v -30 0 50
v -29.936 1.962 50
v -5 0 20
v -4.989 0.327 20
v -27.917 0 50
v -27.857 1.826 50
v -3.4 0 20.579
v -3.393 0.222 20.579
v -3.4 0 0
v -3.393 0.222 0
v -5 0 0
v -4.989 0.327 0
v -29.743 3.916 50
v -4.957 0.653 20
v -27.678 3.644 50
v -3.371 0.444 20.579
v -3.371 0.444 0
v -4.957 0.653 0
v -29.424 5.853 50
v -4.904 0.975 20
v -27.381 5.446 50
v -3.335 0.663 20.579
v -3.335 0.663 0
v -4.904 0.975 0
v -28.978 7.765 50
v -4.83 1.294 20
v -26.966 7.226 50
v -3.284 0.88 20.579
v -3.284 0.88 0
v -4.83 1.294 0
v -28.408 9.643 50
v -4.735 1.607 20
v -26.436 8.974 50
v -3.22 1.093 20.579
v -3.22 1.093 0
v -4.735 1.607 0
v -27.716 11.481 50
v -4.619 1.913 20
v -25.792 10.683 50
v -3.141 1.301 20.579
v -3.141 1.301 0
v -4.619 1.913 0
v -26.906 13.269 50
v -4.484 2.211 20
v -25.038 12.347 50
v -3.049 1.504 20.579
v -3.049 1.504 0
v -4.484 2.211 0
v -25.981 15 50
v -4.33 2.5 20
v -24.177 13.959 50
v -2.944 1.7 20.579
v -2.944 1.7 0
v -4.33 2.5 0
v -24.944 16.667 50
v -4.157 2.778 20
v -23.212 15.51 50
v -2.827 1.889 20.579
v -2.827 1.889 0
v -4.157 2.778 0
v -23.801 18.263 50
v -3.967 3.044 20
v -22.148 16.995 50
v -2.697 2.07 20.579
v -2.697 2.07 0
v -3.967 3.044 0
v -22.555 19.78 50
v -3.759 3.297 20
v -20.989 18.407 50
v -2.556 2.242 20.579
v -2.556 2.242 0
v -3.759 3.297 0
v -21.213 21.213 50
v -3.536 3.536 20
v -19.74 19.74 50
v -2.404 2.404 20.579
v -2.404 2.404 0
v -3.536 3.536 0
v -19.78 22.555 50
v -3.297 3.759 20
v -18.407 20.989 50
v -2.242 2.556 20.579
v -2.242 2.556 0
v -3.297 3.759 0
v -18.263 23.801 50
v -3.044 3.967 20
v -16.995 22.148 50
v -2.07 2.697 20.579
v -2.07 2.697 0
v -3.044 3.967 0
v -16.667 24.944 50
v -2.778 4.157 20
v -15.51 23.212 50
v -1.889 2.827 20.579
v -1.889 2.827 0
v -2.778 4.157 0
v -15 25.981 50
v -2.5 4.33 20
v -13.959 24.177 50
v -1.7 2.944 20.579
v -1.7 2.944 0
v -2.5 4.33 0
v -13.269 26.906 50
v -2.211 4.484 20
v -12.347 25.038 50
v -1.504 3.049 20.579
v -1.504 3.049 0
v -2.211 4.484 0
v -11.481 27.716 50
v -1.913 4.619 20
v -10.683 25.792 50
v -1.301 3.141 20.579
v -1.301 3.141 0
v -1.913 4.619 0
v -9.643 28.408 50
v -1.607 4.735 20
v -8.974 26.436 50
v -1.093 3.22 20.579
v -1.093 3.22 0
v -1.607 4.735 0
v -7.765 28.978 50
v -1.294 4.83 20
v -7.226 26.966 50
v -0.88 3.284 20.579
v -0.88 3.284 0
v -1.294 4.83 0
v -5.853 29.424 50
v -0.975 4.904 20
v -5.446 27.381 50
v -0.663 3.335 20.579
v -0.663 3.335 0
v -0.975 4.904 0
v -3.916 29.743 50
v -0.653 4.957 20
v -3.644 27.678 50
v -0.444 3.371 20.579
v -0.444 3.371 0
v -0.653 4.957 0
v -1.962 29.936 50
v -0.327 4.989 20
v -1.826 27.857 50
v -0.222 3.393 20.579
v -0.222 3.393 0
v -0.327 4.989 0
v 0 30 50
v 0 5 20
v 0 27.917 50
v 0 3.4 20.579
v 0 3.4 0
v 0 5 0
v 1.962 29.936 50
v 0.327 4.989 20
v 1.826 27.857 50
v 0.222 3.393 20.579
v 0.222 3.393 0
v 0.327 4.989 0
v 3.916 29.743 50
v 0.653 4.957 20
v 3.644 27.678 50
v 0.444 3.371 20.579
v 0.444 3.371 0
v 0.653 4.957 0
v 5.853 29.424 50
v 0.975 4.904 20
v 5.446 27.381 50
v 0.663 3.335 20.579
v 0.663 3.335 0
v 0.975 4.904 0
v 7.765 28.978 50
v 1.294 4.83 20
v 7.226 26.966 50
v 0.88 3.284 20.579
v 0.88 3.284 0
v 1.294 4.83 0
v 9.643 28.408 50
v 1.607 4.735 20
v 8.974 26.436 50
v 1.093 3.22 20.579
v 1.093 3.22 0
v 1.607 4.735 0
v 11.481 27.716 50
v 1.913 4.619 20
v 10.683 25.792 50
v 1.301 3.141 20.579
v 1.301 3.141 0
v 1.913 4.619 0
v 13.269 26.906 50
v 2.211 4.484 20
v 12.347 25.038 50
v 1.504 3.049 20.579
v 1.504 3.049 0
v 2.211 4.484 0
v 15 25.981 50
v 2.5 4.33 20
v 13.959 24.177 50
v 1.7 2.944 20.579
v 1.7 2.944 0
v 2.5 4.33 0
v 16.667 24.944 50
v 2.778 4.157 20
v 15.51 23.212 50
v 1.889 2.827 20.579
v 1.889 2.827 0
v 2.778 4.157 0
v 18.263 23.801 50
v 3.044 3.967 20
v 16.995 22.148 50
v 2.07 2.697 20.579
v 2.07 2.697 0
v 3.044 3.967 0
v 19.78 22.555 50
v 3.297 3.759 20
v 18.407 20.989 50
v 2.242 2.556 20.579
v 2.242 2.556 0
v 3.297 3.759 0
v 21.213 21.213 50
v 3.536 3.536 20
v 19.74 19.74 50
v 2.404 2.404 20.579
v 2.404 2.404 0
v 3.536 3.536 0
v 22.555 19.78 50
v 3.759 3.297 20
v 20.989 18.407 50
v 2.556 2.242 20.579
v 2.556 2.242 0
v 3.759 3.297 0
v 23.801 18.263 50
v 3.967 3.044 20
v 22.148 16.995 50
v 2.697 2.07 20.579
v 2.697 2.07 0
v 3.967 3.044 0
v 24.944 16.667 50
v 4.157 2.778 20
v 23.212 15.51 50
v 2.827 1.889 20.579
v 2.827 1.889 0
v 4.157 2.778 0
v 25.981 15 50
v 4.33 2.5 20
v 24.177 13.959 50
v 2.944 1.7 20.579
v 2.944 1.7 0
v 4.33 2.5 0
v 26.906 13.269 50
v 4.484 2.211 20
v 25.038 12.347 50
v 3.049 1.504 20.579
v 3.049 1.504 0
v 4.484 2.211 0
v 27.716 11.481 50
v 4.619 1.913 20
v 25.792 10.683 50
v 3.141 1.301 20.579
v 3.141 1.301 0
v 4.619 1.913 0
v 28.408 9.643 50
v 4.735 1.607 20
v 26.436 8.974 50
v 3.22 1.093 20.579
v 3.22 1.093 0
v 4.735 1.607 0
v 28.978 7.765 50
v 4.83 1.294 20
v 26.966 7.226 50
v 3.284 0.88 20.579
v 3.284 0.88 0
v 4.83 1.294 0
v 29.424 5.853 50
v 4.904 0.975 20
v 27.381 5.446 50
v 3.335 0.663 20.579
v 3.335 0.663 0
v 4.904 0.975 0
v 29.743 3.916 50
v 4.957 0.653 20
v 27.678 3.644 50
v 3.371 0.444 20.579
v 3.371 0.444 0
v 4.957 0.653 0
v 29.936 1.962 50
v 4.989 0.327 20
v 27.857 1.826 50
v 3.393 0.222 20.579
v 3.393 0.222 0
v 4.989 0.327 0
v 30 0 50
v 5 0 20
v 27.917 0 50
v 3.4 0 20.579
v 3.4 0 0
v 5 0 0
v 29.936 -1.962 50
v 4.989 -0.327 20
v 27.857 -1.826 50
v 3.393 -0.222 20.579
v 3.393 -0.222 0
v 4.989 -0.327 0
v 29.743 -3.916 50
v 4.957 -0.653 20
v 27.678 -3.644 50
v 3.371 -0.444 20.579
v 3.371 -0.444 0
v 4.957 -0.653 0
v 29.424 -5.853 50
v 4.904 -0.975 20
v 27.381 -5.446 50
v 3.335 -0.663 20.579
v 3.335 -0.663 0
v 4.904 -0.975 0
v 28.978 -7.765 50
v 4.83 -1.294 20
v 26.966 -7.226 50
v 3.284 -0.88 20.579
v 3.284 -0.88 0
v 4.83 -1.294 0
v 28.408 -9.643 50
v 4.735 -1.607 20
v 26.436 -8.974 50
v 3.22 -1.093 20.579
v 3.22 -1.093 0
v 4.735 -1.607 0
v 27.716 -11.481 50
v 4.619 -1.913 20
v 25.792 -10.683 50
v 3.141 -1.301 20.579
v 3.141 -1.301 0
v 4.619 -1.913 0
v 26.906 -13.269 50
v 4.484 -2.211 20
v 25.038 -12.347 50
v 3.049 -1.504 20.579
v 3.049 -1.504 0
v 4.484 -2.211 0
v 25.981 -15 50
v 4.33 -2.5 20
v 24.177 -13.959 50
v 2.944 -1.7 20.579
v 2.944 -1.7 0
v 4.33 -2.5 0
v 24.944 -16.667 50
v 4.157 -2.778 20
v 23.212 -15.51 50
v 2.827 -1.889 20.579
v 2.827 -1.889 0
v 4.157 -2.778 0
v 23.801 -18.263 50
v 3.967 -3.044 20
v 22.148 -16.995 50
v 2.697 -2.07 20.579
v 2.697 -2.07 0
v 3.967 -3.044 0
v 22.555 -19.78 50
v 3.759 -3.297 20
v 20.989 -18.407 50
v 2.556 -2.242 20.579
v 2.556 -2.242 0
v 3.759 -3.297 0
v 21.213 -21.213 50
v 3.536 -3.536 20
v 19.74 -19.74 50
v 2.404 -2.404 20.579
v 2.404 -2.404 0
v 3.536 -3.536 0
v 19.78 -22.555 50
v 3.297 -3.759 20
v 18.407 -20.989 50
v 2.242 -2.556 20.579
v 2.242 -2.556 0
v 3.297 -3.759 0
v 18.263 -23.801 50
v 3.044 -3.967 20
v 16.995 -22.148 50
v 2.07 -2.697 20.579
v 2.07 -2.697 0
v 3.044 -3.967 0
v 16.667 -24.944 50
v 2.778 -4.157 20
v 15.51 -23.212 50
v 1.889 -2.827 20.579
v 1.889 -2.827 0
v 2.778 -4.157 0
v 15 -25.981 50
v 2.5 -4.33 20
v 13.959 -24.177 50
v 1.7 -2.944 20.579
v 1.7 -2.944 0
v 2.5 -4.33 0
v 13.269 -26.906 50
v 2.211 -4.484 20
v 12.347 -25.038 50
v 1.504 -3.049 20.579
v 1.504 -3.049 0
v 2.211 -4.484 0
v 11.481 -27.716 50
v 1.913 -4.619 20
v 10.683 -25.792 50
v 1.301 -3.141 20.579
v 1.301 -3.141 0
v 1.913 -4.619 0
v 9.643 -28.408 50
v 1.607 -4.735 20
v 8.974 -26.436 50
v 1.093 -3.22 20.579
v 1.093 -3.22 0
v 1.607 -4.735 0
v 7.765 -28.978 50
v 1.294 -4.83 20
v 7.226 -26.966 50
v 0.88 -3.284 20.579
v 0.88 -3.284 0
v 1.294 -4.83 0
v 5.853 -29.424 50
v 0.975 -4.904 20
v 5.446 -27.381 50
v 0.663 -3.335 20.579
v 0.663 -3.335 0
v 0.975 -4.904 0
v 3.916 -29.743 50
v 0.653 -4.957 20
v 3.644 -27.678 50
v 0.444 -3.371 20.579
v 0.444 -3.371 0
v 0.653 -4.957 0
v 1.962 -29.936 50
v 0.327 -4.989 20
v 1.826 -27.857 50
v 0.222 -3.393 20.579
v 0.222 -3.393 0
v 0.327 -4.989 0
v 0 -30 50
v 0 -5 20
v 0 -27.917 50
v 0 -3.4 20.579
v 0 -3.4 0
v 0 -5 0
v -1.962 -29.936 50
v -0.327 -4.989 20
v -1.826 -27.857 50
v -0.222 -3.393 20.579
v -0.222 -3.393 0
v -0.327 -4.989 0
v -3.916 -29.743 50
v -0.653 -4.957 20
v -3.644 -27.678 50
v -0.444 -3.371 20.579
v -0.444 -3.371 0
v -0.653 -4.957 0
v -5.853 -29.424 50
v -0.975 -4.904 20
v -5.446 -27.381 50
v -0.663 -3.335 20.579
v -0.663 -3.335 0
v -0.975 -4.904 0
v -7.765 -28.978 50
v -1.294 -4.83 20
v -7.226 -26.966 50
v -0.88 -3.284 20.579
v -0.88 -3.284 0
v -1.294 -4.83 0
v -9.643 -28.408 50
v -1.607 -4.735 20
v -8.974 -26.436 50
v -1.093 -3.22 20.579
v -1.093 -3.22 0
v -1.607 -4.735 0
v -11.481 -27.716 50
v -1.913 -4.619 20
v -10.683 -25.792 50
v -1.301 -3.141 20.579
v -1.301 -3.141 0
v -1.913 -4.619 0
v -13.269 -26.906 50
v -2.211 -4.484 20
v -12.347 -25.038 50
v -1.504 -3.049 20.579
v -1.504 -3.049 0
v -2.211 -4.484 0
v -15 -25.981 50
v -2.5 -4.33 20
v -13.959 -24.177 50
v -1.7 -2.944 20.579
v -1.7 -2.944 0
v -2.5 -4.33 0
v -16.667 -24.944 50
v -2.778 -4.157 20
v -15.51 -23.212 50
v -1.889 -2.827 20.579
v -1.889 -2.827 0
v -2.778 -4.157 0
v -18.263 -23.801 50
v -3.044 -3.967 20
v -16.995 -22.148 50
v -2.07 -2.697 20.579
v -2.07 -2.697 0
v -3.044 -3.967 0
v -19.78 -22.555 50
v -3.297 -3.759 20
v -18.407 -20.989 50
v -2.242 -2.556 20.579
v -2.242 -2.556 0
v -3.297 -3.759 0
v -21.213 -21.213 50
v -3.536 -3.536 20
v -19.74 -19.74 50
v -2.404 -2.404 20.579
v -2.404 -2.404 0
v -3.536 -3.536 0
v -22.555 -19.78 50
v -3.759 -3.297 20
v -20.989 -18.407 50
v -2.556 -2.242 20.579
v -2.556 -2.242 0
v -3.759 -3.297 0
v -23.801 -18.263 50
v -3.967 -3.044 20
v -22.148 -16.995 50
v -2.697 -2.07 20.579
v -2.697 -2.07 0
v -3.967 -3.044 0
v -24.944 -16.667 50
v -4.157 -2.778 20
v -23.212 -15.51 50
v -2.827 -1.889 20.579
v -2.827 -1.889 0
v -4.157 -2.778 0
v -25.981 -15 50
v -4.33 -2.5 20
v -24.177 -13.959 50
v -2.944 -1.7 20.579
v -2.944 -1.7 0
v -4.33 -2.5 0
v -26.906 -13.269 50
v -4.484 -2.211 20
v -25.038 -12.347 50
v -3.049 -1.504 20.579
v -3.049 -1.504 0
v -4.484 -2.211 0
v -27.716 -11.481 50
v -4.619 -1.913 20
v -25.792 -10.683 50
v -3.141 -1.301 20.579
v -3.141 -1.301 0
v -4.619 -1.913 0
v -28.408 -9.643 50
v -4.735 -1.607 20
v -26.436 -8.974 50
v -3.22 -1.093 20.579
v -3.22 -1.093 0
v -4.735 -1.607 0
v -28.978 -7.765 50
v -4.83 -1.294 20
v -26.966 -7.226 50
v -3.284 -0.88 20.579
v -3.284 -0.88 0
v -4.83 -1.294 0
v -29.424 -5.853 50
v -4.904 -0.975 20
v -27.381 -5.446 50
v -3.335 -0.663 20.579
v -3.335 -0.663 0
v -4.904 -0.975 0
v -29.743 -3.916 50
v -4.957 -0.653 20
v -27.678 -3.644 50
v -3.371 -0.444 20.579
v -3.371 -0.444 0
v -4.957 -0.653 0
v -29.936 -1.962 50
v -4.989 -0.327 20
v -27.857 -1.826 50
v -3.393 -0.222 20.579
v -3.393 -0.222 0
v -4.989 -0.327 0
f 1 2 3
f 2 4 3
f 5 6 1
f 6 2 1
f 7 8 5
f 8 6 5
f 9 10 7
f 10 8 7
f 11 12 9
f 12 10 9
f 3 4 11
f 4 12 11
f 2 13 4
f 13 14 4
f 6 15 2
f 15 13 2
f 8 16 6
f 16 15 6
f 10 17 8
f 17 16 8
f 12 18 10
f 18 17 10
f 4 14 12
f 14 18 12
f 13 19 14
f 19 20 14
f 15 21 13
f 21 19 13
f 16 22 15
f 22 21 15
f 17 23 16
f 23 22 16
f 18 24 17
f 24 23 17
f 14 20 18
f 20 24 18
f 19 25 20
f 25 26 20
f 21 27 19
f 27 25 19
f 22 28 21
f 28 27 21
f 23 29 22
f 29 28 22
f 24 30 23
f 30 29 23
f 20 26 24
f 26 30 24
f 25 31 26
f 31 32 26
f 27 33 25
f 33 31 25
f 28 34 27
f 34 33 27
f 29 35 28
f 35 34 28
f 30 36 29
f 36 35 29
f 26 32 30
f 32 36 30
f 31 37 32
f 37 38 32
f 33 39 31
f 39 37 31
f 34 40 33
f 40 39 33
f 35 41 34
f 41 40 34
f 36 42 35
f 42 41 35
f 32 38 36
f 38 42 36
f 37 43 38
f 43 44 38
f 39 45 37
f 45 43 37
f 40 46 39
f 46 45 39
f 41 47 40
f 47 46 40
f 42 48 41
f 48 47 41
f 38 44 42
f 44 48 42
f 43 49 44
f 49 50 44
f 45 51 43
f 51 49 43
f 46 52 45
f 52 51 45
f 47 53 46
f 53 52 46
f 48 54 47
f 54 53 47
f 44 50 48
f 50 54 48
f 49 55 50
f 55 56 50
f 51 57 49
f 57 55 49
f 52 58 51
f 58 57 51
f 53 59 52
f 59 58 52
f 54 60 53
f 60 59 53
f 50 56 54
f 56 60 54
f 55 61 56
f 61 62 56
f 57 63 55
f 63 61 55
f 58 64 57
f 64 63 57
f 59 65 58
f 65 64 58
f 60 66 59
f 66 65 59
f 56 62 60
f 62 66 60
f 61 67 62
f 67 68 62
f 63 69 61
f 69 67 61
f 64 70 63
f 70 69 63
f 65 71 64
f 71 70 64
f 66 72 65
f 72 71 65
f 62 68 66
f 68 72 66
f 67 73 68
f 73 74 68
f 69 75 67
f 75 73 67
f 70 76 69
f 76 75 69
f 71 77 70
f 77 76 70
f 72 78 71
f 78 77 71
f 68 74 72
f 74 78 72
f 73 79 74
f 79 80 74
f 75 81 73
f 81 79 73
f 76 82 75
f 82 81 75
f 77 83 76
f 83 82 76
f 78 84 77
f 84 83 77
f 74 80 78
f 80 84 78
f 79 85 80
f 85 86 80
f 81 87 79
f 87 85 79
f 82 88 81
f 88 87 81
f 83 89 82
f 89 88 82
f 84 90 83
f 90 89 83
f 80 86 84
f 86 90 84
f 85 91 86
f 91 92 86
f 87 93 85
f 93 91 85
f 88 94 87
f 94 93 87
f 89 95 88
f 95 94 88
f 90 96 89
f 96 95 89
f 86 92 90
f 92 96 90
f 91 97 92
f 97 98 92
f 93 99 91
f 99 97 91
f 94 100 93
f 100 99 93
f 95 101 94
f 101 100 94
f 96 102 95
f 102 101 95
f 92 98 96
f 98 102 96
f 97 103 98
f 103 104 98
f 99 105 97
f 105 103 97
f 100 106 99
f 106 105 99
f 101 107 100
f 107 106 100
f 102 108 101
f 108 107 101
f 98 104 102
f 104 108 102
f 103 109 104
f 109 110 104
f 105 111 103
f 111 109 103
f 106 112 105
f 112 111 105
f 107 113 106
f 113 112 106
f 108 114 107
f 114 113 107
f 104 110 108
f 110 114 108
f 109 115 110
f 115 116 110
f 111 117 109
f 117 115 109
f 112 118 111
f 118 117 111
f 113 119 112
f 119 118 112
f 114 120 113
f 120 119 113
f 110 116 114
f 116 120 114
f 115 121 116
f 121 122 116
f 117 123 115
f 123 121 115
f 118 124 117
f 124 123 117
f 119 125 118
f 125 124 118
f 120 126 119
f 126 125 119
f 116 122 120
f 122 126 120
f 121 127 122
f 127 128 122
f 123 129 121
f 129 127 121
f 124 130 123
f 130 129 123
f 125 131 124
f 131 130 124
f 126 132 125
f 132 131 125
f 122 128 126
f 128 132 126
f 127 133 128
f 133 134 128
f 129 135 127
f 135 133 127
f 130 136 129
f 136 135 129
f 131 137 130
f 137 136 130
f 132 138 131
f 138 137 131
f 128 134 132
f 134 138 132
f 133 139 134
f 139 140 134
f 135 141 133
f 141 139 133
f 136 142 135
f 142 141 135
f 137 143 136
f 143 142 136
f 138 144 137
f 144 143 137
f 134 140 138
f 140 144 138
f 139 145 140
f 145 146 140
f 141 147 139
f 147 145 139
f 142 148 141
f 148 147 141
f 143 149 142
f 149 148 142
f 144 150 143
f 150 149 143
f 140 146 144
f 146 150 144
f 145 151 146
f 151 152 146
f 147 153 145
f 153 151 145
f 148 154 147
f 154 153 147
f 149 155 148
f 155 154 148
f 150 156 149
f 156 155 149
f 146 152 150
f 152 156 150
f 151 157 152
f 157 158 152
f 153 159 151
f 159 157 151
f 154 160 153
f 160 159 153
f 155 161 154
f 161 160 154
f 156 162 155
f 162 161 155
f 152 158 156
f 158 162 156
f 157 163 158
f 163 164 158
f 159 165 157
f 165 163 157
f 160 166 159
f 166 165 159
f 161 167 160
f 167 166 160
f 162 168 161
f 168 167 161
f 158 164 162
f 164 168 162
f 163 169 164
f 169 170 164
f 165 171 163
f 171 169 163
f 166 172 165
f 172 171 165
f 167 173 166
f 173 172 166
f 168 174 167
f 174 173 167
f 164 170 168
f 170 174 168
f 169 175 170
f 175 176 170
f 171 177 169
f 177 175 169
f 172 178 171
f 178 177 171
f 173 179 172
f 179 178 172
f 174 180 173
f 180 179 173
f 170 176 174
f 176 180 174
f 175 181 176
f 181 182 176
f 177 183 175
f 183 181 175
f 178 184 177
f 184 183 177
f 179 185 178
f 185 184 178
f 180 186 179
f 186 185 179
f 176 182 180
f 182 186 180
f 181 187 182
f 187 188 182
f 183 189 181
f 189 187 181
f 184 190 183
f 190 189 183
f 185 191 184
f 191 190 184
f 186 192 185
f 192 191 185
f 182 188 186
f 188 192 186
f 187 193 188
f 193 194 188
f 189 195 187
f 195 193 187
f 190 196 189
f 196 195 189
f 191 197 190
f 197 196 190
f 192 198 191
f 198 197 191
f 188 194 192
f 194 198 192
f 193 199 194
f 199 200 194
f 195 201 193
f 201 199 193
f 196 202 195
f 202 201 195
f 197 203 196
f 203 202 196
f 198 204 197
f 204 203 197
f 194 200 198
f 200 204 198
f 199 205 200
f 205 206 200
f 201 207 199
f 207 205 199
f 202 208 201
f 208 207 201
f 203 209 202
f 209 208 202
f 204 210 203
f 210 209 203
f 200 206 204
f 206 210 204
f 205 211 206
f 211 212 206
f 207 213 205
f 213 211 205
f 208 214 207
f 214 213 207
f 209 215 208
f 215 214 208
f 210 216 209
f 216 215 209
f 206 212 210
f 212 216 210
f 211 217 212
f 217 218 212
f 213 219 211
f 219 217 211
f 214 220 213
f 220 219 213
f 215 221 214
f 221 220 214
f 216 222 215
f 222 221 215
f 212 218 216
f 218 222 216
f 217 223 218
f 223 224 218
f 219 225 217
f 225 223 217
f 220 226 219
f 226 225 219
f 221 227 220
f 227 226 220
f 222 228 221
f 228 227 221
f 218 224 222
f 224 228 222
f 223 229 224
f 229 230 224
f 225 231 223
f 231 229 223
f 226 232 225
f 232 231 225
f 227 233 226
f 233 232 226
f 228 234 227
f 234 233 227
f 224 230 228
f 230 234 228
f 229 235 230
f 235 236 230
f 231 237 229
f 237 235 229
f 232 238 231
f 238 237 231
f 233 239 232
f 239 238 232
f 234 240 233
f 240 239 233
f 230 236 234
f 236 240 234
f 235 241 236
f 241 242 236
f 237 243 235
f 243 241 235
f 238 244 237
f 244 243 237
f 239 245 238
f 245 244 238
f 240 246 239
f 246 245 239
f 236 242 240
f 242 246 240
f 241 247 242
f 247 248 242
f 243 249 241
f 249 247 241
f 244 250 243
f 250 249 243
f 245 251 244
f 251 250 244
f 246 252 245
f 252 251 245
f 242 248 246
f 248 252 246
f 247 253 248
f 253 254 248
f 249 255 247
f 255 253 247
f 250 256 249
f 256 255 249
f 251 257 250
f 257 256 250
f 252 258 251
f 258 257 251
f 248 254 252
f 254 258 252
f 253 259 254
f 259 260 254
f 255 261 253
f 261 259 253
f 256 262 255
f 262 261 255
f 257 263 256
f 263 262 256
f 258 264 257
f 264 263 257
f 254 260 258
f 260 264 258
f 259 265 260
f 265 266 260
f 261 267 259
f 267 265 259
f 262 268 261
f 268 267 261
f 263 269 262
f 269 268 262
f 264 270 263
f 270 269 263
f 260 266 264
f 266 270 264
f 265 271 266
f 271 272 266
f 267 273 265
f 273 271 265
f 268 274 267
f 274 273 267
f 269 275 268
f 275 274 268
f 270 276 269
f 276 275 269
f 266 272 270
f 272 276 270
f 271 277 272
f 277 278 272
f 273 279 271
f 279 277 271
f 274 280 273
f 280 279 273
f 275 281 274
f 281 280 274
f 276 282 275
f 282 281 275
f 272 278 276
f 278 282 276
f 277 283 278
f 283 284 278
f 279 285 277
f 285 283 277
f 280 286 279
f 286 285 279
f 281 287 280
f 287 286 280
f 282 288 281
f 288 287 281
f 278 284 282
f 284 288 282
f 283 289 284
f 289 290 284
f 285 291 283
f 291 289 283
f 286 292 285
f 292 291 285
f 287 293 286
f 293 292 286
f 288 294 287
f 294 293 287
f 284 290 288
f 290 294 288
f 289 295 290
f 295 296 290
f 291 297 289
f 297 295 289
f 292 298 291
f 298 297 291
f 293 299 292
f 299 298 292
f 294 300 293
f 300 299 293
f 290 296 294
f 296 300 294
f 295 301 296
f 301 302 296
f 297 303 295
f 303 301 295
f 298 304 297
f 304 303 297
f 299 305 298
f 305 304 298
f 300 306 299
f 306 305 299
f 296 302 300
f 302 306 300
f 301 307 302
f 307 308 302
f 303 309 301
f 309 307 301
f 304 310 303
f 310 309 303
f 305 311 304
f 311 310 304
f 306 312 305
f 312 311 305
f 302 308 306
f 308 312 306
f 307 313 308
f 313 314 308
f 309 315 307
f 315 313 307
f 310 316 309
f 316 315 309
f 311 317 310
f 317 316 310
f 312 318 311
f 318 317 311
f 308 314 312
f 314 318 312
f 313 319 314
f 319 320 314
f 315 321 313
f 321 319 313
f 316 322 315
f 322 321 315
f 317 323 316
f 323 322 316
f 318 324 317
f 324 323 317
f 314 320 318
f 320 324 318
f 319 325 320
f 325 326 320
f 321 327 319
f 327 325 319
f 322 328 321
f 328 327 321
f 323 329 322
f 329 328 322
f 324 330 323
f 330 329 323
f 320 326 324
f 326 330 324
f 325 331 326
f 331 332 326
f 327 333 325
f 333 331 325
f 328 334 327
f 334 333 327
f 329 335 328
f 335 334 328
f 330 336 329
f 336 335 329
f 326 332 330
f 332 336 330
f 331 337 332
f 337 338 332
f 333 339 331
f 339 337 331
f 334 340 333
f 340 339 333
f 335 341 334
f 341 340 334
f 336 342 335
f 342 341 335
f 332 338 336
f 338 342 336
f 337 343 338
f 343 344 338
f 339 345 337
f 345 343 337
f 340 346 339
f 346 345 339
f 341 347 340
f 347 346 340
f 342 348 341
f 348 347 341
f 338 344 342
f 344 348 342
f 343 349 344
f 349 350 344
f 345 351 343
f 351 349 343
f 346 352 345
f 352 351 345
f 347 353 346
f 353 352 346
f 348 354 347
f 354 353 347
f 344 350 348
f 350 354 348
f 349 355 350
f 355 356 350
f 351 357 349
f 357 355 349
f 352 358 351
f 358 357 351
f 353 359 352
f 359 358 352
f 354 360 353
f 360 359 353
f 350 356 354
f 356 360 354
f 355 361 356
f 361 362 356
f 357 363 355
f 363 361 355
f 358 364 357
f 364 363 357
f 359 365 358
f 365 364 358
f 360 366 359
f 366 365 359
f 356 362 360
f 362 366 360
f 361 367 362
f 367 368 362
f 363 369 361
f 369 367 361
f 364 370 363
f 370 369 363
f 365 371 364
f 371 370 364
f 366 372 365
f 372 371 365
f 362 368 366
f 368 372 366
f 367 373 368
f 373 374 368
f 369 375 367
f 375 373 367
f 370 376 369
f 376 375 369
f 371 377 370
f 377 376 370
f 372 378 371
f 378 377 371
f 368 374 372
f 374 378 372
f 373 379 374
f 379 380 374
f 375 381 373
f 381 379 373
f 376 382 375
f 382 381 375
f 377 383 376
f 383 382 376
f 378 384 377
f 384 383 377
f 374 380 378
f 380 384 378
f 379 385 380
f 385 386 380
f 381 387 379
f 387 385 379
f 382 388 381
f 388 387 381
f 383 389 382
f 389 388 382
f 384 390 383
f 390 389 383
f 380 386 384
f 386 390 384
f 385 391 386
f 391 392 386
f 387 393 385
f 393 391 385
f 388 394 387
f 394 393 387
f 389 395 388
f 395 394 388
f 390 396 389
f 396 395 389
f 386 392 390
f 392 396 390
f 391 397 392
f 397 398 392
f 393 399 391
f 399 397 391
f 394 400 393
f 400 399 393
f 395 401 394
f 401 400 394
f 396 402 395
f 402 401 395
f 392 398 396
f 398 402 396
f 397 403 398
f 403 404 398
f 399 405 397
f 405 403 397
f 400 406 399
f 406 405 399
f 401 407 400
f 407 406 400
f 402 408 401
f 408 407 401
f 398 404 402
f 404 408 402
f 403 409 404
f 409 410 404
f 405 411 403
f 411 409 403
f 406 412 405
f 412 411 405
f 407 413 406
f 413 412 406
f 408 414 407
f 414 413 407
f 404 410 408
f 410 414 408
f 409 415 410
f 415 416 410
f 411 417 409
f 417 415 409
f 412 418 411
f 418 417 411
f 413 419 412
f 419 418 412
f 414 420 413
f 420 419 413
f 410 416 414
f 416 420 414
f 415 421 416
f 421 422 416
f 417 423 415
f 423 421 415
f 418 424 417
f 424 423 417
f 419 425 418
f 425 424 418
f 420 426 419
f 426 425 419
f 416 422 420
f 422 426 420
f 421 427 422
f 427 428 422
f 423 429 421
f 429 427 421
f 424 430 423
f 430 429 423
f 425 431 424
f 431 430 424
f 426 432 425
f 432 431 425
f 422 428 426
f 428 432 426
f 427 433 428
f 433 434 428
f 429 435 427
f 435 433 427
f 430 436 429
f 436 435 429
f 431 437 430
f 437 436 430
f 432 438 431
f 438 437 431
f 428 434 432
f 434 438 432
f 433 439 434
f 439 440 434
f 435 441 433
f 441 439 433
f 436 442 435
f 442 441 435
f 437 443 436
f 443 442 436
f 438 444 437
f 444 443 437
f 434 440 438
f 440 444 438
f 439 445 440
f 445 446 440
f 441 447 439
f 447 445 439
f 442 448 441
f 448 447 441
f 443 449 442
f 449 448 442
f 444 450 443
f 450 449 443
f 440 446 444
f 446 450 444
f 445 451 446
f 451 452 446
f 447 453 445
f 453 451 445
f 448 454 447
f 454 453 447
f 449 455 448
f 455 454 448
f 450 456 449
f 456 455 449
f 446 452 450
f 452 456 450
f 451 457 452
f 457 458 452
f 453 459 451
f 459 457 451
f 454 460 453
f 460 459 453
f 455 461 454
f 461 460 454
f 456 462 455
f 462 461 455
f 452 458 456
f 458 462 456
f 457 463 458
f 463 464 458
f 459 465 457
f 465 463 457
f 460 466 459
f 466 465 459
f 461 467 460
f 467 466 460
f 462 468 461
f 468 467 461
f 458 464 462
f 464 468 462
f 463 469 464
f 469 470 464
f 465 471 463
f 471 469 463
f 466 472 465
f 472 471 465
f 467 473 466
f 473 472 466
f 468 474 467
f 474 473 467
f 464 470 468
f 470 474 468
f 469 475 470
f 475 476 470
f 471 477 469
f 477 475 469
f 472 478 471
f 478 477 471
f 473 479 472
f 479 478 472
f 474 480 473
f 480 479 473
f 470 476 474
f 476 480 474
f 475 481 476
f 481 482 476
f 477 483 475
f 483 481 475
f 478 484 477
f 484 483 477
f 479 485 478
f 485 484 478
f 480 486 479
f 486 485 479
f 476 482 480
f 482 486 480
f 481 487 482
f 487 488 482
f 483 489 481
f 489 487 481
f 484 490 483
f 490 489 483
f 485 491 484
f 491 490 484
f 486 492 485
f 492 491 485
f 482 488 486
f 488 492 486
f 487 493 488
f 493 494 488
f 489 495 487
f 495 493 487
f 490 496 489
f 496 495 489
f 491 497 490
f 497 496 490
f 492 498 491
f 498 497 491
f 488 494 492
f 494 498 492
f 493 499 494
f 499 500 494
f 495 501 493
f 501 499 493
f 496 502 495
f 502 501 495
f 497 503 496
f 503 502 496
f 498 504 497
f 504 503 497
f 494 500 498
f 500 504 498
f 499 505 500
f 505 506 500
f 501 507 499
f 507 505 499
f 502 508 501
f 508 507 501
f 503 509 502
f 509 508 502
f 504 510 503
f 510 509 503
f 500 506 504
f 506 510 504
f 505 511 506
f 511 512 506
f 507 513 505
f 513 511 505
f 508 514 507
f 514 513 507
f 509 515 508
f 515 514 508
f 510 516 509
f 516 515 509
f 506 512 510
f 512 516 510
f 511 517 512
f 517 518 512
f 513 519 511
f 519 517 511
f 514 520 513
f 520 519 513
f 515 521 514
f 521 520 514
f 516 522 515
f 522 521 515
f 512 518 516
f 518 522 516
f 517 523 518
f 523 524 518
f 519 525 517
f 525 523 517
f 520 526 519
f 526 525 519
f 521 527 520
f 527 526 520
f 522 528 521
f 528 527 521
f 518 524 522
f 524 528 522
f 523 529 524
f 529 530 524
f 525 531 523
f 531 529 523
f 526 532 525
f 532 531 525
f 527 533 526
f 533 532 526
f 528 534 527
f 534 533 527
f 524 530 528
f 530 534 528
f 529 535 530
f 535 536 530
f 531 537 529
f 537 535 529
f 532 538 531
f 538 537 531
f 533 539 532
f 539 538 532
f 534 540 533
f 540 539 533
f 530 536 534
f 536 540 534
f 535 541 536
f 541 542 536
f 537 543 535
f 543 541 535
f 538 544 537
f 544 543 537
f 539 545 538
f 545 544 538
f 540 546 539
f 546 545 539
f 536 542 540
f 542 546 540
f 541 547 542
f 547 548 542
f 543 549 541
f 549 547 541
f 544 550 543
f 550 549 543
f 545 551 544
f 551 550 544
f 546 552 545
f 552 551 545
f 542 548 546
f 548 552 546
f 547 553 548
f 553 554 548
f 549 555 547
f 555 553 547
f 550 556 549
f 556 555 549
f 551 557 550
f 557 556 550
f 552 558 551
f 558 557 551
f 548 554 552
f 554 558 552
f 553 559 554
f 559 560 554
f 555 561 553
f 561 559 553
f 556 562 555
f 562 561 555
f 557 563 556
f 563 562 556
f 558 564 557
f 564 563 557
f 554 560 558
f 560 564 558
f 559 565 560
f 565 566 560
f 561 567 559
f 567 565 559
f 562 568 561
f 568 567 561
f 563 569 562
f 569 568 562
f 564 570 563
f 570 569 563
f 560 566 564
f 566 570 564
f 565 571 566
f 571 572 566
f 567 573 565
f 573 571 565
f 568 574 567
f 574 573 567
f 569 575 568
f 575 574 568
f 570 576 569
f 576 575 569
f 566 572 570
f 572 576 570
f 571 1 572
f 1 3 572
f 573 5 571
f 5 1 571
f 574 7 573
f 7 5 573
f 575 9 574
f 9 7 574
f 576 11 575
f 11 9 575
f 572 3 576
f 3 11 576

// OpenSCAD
// Lab funnel, printed upright (wide opening at top), open at both ends

$fn = 96;

spout_od     = 10;    // spout outer diameter
spout_h      = 20;    // spout height (z = 0 to 20)
rim_od       = 60;    // outer diameter at the rim
cone_top_z   = 50;    // z of the rim
wall         = 1.6;   // wall thickness (measured perpendicular to the surface)

// derived values
spout_or     = spout_od / 2;
spout_ir     = spout_or - wall;                       // 3.4 mm bore radius
rim_or       = rim_od / 2;
cone_dr      = rim_or - spout_or;                     // radial growth of cone
cone_dz      = cone_top_z - spout_h;                  // height of cone
cone_ang     = atan(cone_dr / cone_dz);               // cone half-angle from vertical
wall_h       = wall / cos(cone_ang);                  // horizontal wall width in the cone
rim_ir       = rim_or - wall_h;                       // inner radius at rim
// z where inner cone surface meets the spout bore
inner_join_z = spout_h + (spout_ir - (spout_or - wall_h)) * cone_dz / cone_dr;

rotate_extrude(convexity = 10)
    polygon([
        [spout_or, 0],
        [spout_or, spout_h],
        [rim_or,   cone_top_z],
        [rim_ir,   cone_top_z],
        [spout_ir, inner_join_z],
        [spout_ir, 0]
    ]);
